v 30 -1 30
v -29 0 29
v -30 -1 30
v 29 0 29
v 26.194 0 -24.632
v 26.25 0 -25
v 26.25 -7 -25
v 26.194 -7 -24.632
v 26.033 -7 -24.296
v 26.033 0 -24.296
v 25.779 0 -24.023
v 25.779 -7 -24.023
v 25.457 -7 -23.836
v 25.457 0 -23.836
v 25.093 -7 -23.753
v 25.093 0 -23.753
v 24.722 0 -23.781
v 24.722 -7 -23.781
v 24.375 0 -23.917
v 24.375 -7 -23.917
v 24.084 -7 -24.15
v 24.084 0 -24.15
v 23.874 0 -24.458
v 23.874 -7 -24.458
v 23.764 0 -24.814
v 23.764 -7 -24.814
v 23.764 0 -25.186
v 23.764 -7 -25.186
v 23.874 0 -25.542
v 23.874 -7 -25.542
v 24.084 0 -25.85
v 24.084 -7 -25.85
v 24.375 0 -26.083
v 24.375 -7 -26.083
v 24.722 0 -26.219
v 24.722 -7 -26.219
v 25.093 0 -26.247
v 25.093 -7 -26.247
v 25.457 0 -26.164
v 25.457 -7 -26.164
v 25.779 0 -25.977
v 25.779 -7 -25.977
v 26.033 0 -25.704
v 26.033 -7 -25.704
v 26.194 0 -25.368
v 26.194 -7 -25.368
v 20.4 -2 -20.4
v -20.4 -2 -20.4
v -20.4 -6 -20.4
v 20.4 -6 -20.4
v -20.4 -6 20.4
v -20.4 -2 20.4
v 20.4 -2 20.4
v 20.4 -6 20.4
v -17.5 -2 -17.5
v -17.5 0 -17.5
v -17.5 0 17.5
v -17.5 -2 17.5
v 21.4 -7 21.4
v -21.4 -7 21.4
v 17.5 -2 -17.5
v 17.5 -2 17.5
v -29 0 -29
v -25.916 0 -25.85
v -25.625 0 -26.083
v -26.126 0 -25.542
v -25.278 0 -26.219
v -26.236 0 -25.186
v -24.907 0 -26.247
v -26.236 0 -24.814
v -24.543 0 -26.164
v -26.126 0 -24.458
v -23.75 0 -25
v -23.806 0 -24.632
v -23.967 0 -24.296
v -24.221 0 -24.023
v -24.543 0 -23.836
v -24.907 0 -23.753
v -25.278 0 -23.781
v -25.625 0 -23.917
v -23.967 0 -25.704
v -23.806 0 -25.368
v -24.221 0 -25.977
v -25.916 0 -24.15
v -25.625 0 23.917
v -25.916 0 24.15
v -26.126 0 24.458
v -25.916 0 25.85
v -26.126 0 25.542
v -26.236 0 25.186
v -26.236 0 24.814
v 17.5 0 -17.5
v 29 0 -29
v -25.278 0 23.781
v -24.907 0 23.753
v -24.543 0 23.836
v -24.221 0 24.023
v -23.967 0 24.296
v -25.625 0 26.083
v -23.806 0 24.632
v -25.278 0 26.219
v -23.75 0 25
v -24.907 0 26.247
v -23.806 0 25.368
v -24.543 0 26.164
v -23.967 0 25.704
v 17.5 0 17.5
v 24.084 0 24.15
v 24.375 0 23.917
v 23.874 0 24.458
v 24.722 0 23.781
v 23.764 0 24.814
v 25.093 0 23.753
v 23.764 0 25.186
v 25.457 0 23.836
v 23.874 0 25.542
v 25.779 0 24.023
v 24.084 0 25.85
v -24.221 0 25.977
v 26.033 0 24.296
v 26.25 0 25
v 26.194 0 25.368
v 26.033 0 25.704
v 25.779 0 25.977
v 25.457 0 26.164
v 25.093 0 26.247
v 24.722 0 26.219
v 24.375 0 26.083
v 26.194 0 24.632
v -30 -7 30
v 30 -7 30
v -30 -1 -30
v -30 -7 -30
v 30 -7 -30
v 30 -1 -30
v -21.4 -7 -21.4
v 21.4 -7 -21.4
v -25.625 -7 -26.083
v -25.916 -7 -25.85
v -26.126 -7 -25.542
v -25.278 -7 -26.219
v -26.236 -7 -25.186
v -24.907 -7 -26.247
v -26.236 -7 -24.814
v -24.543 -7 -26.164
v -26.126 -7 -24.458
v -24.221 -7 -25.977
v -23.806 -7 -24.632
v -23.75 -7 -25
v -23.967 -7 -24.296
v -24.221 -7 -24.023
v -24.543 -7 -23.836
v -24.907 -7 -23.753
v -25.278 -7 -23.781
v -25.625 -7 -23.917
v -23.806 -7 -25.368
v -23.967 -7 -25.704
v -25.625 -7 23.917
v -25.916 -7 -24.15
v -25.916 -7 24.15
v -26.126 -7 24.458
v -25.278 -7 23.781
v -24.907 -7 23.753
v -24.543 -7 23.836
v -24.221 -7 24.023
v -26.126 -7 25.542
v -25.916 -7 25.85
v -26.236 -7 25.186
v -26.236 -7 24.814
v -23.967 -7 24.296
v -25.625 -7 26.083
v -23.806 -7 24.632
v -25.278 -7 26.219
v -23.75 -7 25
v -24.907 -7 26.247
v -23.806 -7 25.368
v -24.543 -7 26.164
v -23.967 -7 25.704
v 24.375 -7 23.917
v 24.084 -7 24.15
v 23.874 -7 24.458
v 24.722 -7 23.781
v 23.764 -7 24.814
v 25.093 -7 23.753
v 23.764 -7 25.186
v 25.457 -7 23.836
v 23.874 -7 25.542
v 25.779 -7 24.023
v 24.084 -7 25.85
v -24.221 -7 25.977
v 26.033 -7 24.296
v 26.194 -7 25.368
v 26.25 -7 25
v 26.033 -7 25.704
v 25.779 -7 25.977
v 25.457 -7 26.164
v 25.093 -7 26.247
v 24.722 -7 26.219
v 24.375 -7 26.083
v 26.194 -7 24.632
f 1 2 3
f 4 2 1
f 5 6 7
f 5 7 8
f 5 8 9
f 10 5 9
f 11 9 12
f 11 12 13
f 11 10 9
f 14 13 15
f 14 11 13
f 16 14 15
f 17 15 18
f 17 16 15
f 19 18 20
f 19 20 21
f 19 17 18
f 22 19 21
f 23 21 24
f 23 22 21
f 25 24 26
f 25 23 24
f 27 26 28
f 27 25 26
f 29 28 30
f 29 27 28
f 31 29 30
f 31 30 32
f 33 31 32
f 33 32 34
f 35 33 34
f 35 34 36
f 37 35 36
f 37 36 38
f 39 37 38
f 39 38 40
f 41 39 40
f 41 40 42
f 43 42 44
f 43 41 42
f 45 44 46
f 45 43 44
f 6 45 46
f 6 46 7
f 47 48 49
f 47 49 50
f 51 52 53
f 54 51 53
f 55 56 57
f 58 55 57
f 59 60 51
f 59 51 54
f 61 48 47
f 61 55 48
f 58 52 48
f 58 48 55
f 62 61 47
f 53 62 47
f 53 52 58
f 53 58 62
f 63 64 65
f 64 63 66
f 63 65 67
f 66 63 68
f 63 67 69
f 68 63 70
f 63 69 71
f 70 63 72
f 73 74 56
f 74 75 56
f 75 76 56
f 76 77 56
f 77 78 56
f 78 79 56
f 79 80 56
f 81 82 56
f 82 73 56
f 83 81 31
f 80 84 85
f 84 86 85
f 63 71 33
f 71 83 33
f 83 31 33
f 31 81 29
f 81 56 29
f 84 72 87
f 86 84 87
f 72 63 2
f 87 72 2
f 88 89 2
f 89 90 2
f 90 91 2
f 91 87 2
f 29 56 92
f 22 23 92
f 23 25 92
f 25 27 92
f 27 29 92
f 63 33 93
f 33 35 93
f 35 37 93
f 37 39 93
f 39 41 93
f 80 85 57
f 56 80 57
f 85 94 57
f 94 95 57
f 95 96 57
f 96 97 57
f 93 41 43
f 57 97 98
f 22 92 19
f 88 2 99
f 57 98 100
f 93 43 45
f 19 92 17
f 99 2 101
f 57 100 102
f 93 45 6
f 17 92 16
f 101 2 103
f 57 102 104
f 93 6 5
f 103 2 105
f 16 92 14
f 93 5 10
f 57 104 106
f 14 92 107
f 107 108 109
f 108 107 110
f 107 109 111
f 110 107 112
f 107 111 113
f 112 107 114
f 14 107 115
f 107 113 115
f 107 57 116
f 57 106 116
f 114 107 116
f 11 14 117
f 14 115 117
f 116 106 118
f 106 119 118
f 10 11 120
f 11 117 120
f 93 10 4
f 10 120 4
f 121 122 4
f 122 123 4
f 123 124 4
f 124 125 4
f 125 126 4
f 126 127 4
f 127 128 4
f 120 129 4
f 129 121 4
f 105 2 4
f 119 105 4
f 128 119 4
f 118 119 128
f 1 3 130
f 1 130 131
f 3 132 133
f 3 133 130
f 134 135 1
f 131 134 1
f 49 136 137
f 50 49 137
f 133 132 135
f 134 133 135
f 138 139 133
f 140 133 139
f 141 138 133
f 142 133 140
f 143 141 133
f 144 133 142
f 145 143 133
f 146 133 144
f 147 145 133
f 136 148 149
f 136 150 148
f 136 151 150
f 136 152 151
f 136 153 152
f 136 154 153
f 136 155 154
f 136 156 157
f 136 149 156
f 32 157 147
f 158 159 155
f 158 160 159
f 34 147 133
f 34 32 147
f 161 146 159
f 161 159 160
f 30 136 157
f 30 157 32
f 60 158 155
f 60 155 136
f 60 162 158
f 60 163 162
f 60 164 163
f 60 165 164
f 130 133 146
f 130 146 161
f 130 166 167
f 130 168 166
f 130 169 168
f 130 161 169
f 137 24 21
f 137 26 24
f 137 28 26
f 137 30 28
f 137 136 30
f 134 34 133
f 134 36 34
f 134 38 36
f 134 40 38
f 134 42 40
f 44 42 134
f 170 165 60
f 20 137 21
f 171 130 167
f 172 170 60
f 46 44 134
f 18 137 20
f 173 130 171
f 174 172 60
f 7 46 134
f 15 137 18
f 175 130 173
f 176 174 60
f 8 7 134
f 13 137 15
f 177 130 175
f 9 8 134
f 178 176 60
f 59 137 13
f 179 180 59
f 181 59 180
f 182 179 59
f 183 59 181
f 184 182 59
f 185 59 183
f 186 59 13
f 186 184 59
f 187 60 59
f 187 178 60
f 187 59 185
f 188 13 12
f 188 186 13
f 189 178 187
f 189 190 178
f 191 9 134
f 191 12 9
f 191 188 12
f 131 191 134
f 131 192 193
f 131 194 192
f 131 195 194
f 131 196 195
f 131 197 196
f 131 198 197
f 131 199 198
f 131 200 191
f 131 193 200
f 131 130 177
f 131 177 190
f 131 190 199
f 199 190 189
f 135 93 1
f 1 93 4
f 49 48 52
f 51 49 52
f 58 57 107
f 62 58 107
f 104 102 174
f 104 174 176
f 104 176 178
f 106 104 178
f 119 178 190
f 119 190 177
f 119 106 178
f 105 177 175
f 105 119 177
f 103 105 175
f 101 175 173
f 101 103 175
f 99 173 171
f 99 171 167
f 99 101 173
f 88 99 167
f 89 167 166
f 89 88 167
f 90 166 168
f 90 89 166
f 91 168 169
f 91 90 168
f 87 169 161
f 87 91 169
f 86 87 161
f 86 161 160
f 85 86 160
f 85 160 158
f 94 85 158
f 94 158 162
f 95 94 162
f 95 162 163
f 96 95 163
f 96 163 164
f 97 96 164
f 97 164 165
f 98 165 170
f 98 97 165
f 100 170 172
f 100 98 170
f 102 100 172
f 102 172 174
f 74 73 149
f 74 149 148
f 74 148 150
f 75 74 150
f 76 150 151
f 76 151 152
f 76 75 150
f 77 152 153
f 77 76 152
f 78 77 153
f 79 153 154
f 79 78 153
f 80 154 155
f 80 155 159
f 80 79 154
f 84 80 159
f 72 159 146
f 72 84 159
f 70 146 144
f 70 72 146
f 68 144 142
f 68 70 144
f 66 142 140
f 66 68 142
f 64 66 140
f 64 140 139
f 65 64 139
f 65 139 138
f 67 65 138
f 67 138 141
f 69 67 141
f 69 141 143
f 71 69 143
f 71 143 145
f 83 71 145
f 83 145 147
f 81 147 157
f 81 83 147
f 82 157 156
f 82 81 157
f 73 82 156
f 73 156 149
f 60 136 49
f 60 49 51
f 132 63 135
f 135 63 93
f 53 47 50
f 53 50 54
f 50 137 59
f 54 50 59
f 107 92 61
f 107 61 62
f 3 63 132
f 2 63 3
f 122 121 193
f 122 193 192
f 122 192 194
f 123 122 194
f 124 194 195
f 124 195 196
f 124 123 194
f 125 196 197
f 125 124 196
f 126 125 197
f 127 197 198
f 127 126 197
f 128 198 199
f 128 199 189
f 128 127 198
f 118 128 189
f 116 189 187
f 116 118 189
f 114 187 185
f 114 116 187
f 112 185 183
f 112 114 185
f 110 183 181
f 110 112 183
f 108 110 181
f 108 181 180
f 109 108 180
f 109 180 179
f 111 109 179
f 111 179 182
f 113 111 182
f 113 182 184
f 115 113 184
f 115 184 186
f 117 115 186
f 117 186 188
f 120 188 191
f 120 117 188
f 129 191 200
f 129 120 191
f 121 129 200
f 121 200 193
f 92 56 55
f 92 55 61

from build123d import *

# Parameters (mm, degrees)
F0_W     = 60
F0_H     = 60
F0_R     = 1.25
F0_W_2   = 40.8
F0_H_2   = 40.8
F1_DEPTH = 7
F0_W_3   = 35
F0_H_3   = 35
F2_DEPTH = 2
F3_SIZE  = 1
F4_SIZE  = 1


with BuildPart() as f1:
    # F0 (on Front) → F1 (new body)
    with BuildSketch(Plane.XZ):
        Rectangle(F0_W, F0_H)
        with Locations((-25, -25)):
            Circle(F0_R, mode=Mode.SUBTRACT)
        with Locations((25, -25)):
            Circle(F0_R, mode=Mode.SUBTRACT)
        with Locations((-25, 25)):
            Circle(F0_R, mode=Mode.SUBTRACT)
        Rectangle(F0_W_2, F0_H_2, mode=Mode.SUBTRACT)
        with Locations((25, 25)):
            Circle(F0_R, mode=Mode.SUBTRACT)
    extrude(amount=F1_DEPTH)

    # F0 (on Front) → F2 (join)
    with BuildSketch(Plane.XZ):
        Rectangle(F0_W_2, F0_H_2)
        Rectangle(F0_W_3, F0_H_3, mode=Mode.SUBTRACT)
    extrude(amount=F2_DEPTH)

    # F3
    f3_edges = [f1.edges().sort_by_distance(p)[0] for p in [
        (20.4, -7, 0),
        (0, -7, 20.4),
        (-20.4, -7, 0),
        (0, -7, -20.4),
    ]]
    chamfer(f3_edges, length=F3_SIZE)

    # F4
    f4_edges = [f1.edges().sort_by_distance(p)[0] for p in [
        (-30, 0, 0),
        (0, 0, -30),
        (30, 0, 0),
        (0, 0, 30),
    ]]
    chamfer(f4_edges, length=F4_SIZE)


solid = f1.part
